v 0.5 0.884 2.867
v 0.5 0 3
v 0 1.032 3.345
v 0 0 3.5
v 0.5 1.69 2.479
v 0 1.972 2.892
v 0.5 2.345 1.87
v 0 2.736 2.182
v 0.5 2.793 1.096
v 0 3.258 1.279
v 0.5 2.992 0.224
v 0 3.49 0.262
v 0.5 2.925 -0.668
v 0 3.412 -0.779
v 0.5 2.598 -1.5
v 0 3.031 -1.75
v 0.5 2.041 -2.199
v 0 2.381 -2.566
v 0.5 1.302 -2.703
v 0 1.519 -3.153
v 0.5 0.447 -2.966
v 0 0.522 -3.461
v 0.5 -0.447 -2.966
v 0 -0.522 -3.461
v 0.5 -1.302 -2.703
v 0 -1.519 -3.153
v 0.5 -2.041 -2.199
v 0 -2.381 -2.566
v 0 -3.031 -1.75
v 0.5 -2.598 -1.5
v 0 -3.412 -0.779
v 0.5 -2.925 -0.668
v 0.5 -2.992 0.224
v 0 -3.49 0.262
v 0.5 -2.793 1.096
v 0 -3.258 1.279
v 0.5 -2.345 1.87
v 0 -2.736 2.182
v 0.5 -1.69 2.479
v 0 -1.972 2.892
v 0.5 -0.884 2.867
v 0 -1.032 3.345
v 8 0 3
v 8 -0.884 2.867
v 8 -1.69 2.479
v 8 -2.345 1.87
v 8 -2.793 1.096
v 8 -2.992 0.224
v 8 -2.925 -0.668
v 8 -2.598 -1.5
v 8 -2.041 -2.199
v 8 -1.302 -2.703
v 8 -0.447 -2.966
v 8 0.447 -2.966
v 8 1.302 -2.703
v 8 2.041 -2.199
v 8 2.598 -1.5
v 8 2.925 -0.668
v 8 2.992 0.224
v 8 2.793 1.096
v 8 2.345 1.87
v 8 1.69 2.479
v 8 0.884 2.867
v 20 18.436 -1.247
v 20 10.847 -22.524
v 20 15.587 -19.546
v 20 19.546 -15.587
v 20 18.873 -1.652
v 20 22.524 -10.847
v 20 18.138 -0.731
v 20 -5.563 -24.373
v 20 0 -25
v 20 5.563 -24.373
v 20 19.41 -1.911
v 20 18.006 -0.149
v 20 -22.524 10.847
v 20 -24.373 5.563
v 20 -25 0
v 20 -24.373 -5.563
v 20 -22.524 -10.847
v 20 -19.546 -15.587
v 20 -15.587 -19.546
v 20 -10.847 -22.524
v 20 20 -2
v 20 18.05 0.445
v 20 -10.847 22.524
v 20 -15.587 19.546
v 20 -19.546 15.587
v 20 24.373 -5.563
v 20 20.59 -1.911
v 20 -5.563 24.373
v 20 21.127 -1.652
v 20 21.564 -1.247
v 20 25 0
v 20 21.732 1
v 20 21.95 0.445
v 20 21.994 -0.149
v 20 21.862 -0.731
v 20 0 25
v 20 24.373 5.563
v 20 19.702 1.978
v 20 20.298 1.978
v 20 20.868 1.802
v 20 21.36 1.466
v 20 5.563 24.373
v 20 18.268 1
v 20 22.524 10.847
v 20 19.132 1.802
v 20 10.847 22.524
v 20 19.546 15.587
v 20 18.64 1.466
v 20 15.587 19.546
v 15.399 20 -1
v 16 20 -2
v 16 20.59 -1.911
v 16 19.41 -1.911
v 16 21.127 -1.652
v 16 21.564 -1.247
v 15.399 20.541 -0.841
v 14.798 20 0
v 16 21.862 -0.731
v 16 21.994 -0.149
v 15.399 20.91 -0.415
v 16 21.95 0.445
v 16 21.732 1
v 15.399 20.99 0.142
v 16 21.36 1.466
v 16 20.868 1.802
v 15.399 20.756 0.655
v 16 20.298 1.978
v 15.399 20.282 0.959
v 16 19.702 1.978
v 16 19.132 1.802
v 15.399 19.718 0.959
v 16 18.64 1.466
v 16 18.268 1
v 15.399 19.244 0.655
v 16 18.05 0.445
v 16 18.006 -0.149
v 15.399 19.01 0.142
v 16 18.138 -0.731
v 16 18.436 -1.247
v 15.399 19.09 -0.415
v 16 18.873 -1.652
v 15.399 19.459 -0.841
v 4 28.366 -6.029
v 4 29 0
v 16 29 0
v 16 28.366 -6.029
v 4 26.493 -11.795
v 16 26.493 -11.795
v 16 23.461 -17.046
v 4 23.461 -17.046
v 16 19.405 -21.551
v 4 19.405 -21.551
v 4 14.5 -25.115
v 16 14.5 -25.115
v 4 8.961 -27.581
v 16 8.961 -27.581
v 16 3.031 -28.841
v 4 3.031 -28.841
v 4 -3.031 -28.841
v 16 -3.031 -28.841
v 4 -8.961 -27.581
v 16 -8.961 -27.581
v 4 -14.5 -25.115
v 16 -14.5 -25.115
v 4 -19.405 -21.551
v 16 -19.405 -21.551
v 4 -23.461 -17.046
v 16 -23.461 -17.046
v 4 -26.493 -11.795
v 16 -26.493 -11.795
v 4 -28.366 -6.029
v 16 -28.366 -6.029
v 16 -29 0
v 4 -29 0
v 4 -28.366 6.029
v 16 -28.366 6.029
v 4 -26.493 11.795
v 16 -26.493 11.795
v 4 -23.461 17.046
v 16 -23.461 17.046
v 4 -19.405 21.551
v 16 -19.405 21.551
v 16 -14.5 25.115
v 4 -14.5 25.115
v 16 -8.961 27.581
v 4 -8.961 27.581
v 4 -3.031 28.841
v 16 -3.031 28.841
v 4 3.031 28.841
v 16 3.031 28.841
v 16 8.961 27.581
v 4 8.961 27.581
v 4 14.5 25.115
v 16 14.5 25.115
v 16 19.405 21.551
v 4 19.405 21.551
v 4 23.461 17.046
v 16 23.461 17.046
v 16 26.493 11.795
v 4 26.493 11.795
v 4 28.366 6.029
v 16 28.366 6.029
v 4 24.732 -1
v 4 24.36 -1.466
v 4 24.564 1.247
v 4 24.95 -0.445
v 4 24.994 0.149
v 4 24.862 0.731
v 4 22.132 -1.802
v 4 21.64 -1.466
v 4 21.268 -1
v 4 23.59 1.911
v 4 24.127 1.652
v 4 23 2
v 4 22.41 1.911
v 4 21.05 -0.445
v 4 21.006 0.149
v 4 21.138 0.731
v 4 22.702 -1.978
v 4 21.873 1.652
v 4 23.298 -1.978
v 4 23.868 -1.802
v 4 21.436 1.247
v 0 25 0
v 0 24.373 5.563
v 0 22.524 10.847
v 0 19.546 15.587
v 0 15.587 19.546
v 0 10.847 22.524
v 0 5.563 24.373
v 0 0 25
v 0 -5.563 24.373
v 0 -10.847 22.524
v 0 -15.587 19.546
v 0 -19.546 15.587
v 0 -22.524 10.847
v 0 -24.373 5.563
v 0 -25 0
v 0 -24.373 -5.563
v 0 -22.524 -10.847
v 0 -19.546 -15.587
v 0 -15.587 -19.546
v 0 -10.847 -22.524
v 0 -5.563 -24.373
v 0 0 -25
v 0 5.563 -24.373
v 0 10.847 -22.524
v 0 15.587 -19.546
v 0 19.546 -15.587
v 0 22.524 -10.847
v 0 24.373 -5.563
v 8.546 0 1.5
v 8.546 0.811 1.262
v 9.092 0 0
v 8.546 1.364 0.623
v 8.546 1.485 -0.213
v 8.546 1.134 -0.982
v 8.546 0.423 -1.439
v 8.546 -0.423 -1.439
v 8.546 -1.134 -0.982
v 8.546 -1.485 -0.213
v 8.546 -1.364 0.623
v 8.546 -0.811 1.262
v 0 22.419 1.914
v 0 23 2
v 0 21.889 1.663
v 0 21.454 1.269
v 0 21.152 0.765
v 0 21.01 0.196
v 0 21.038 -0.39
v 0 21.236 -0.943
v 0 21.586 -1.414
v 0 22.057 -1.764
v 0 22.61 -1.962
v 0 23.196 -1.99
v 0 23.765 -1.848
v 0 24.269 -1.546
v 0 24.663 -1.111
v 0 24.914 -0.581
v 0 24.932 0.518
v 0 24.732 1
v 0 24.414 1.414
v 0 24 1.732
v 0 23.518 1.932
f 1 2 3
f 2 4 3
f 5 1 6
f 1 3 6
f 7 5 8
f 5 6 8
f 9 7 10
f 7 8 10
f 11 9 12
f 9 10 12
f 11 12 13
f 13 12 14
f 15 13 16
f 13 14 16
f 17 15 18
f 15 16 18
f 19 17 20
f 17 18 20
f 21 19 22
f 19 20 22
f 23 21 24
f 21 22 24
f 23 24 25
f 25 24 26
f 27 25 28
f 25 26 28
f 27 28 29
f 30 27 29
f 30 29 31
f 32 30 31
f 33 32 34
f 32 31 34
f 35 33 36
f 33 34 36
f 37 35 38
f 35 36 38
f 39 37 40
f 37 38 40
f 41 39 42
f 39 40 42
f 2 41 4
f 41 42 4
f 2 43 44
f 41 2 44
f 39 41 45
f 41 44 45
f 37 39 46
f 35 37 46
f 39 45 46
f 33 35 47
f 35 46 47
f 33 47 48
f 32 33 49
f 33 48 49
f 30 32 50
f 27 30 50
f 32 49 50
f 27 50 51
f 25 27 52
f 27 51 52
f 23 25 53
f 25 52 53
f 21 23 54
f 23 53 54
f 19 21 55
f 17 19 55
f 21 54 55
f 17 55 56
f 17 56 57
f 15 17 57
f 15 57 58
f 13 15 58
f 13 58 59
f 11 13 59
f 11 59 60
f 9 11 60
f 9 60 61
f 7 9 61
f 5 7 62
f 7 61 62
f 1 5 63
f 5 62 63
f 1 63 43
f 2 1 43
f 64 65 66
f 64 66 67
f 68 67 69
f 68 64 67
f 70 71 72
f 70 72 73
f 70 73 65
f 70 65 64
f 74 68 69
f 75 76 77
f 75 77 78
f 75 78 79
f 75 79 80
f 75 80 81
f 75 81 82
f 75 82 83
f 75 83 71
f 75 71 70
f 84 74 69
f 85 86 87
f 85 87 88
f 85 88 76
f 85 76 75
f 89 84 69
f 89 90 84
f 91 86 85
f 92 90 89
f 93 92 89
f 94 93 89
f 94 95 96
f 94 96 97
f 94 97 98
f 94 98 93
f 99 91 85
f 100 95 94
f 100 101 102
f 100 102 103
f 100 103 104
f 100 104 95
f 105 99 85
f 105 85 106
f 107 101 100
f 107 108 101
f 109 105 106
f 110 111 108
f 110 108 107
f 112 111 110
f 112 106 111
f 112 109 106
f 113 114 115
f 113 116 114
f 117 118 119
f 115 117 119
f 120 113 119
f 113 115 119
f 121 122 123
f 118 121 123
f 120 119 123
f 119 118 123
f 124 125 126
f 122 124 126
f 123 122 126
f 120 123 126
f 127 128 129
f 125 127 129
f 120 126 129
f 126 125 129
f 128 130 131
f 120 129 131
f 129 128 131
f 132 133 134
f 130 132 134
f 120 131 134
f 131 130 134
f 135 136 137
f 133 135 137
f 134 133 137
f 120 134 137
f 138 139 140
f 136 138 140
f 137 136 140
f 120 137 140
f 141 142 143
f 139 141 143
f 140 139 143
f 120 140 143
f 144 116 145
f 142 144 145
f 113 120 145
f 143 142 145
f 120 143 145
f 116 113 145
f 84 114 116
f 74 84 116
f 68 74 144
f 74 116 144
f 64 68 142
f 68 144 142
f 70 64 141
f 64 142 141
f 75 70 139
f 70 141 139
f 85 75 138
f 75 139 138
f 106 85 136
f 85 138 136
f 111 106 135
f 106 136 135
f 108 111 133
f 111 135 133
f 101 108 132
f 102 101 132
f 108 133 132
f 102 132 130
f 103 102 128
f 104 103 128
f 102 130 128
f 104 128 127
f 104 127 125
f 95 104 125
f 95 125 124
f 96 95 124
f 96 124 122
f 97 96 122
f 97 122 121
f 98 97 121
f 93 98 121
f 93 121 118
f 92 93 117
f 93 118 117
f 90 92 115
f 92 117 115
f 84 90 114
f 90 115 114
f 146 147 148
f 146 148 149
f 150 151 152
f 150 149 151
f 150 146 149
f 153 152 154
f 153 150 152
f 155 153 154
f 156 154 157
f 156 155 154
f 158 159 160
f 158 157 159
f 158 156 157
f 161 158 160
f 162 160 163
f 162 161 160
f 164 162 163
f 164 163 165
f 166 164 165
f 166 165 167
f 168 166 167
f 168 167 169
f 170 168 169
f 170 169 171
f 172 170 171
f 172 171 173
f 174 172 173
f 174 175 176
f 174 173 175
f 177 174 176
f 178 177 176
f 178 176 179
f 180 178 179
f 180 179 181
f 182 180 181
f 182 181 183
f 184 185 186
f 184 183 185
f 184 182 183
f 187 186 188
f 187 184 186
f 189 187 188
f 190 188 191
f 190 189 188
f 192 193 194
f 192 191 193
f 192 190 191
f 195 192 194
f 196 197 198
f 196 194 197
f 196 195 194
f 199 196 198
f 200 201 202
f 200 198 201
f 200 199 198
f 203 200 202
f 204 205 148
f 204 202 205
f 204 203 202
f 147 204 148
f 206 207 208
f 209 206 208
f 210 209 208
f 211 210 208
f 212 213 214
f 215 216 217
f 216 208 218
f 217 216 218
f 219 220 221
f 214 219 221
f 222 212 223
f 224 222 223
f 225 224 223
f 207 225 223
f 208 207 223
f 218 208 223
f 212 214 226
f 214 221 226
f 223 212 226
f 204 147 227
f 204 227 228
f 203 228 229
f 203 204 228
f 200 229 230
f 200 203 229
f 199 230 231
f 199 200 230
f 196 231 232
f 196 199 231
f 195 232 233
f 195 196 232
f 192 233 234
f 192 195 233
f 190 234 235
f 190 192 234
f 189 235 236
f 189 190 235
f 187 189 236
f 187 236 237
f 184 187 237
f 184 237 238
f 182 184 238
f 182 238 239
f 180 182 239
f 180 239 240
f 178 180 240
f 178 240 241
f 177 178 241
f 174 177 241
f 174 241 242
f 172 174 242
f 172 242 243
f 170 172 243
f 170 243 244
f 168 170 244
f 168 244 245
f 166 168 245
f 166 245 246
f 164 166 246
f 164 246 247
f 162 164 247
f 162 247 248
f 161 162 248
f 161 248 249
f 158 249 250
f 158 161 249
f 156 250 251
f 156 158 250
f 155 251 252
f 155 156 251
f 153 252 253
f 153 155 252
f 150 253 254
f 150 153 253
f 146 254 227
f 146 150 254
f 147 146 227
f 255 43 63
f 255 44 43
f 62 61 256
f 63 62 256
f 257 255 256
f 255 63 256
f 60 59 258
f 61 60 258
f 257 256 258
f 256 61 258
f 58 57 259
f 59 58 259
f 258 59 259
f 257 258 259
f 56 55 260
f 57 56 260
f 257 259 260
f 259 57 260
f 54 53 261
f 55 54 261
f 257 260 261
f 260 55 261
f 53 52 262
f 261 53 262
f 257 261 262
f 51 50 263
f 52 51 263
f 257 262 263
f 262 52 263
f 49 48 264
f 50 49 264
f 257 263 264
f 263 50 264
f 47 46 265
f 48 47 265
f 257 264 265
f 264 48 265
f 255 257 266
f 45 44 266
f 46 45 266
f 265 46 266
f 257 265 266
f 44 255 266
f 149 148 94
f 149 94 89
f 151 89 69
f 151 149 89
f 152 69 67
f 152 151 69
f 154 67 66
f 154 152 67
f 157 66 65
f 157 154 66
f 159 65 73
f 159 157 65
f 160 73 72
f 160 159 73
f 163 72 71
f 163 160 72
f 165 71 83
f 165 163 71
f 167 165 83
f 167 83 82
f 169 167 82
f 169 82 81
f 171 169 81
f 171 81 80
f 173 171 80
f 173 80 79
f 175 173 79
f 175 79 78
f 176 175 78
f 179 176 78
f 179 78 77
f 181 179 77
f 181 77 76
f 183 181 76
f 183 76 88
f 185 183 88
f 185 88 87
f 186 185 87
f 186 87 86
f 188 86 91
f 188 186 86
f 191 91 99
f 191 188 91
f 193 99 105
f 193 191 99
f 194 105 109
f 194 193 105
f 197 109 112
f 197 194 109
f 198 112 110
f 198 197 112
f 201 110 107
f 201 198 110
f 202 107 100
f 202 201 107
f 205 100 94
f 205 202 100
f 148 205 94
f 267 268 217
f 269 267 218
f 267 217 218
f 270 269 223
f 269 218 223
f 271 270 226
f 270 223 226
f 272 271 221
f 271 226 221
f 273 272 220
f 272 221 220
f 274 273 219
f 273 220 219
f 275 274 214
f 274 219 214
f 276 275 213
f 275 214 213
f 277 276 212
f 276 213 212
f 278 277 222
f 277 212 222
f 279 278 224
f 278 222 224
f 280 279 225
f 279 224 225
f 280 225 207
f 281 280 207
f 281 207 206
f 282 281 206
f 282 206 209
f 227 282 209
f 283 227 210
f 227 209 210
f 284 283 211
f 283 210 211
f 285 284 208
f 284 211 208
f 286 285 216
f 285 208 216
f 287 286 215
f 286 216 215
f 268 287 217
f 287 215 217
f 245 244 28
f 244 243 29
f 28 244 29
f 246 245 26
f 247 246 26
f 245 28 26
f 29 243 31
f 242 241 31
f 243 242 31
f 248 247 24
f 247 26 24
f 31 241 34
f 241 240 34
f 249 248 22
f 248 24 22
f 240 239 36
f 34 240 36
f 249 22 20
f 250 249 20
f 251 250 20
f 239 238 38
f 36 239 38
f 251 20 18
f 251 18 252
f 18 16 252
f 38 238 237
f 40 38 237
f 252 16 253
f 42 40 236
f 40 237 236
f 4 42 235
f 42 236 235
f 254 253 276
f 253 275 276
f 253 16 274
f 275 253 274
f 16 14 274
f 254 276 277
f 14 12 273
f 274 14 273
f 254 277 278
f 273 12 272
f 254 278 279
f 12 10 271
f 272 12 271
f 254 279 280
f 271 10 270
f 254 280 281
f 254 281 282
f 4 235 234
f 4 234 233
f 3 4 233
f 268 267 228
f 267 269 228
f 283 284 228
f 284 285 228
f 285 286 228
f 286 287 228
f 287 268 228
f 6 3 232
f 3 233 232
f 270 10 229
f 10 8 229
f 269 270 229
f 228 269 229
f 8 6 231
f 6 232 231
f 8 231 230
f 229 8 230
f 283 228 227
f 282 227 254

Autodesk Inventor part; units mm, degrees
ref_plane "YZ Plane" through (0, 0, 0) normal (1, 0, 0) x (0, 1, 0)
ref_plane "XZ Plane" through (0, 0, 0) normal (0, 1, 0) x (-1, 0, 0)
ref_plane "XY Plane" through (0, 0, 0) normal (0, 0, 1) x (1, 0, 0)
sketch "Эскиз5" plane through (0, 0, 0) normal (0, 0, 1) x (1, 0, 0)
  line L0 (0, 0) -> (20, 0)
  line L1 (20, 0) -> (20, 25)
  line L2 (16, 29) -> (4, 29)
  line L3 (0, 25) -> (0, 0)
  line L4 (4, 29) -> (0, 25)
  line L5 (16, 29) -> (20, 25)
  point P0 (20, 29)
  point P1 (0, 29)
  dimension "d42" = 20
  dimension "d43" = 29
  dimension "d44" = 4
  dimension "d45" = 4
  dimension "d46" = 4
  dimension "d47" = 4
revolve "Вращение3" add sketch "Эскиз5" angle 360 about axis through (0, 0, 0) along (1, 0, 0)
sketch "Эскиз6" plane through (0, 0, 0) normal (-1, 0, 0) x (0, 0, 1)
  point P0 (0, 0)
  point P1 (0, 0)
hole "Отверстие3" at (0, 0, 0) direction (1, 0, 0) diameter 6 depth 8 tip angle 140 countersink diameter 7 countersink angle 90
sketch "Эскиз8" plane through (0, 0, 0) normal (-1, 0, 0) x (0, 0, 1)
  line L0 (0, 0) -> (0, 23) construction
  dimension "d56" = 23
hole "Отверстие4" at (0, 23, 0) direction (1, 0, 0) diameter 4 depth 4
sketch "Эскиз9" plane through (20, 0, 0) normal (1, 0, 0) x (0, 0, -1)
  line L0 (0, 0) -> (0, 20) construction
  dimension "d64" = 20
hole "Отверстие5" at (20, 20, 0) direction (-1, 0, 0) diameter 4 depth 4 tip angle 118
thread "Резьба3" size "M6x1" class "6H" standard "ANSI Metric M Profile" full length
equation "\"d45\" = d44"
equation "\"d46\" = d44"
equation "\"d47\" = d46"
properties part number "711138 (Доделать)"
